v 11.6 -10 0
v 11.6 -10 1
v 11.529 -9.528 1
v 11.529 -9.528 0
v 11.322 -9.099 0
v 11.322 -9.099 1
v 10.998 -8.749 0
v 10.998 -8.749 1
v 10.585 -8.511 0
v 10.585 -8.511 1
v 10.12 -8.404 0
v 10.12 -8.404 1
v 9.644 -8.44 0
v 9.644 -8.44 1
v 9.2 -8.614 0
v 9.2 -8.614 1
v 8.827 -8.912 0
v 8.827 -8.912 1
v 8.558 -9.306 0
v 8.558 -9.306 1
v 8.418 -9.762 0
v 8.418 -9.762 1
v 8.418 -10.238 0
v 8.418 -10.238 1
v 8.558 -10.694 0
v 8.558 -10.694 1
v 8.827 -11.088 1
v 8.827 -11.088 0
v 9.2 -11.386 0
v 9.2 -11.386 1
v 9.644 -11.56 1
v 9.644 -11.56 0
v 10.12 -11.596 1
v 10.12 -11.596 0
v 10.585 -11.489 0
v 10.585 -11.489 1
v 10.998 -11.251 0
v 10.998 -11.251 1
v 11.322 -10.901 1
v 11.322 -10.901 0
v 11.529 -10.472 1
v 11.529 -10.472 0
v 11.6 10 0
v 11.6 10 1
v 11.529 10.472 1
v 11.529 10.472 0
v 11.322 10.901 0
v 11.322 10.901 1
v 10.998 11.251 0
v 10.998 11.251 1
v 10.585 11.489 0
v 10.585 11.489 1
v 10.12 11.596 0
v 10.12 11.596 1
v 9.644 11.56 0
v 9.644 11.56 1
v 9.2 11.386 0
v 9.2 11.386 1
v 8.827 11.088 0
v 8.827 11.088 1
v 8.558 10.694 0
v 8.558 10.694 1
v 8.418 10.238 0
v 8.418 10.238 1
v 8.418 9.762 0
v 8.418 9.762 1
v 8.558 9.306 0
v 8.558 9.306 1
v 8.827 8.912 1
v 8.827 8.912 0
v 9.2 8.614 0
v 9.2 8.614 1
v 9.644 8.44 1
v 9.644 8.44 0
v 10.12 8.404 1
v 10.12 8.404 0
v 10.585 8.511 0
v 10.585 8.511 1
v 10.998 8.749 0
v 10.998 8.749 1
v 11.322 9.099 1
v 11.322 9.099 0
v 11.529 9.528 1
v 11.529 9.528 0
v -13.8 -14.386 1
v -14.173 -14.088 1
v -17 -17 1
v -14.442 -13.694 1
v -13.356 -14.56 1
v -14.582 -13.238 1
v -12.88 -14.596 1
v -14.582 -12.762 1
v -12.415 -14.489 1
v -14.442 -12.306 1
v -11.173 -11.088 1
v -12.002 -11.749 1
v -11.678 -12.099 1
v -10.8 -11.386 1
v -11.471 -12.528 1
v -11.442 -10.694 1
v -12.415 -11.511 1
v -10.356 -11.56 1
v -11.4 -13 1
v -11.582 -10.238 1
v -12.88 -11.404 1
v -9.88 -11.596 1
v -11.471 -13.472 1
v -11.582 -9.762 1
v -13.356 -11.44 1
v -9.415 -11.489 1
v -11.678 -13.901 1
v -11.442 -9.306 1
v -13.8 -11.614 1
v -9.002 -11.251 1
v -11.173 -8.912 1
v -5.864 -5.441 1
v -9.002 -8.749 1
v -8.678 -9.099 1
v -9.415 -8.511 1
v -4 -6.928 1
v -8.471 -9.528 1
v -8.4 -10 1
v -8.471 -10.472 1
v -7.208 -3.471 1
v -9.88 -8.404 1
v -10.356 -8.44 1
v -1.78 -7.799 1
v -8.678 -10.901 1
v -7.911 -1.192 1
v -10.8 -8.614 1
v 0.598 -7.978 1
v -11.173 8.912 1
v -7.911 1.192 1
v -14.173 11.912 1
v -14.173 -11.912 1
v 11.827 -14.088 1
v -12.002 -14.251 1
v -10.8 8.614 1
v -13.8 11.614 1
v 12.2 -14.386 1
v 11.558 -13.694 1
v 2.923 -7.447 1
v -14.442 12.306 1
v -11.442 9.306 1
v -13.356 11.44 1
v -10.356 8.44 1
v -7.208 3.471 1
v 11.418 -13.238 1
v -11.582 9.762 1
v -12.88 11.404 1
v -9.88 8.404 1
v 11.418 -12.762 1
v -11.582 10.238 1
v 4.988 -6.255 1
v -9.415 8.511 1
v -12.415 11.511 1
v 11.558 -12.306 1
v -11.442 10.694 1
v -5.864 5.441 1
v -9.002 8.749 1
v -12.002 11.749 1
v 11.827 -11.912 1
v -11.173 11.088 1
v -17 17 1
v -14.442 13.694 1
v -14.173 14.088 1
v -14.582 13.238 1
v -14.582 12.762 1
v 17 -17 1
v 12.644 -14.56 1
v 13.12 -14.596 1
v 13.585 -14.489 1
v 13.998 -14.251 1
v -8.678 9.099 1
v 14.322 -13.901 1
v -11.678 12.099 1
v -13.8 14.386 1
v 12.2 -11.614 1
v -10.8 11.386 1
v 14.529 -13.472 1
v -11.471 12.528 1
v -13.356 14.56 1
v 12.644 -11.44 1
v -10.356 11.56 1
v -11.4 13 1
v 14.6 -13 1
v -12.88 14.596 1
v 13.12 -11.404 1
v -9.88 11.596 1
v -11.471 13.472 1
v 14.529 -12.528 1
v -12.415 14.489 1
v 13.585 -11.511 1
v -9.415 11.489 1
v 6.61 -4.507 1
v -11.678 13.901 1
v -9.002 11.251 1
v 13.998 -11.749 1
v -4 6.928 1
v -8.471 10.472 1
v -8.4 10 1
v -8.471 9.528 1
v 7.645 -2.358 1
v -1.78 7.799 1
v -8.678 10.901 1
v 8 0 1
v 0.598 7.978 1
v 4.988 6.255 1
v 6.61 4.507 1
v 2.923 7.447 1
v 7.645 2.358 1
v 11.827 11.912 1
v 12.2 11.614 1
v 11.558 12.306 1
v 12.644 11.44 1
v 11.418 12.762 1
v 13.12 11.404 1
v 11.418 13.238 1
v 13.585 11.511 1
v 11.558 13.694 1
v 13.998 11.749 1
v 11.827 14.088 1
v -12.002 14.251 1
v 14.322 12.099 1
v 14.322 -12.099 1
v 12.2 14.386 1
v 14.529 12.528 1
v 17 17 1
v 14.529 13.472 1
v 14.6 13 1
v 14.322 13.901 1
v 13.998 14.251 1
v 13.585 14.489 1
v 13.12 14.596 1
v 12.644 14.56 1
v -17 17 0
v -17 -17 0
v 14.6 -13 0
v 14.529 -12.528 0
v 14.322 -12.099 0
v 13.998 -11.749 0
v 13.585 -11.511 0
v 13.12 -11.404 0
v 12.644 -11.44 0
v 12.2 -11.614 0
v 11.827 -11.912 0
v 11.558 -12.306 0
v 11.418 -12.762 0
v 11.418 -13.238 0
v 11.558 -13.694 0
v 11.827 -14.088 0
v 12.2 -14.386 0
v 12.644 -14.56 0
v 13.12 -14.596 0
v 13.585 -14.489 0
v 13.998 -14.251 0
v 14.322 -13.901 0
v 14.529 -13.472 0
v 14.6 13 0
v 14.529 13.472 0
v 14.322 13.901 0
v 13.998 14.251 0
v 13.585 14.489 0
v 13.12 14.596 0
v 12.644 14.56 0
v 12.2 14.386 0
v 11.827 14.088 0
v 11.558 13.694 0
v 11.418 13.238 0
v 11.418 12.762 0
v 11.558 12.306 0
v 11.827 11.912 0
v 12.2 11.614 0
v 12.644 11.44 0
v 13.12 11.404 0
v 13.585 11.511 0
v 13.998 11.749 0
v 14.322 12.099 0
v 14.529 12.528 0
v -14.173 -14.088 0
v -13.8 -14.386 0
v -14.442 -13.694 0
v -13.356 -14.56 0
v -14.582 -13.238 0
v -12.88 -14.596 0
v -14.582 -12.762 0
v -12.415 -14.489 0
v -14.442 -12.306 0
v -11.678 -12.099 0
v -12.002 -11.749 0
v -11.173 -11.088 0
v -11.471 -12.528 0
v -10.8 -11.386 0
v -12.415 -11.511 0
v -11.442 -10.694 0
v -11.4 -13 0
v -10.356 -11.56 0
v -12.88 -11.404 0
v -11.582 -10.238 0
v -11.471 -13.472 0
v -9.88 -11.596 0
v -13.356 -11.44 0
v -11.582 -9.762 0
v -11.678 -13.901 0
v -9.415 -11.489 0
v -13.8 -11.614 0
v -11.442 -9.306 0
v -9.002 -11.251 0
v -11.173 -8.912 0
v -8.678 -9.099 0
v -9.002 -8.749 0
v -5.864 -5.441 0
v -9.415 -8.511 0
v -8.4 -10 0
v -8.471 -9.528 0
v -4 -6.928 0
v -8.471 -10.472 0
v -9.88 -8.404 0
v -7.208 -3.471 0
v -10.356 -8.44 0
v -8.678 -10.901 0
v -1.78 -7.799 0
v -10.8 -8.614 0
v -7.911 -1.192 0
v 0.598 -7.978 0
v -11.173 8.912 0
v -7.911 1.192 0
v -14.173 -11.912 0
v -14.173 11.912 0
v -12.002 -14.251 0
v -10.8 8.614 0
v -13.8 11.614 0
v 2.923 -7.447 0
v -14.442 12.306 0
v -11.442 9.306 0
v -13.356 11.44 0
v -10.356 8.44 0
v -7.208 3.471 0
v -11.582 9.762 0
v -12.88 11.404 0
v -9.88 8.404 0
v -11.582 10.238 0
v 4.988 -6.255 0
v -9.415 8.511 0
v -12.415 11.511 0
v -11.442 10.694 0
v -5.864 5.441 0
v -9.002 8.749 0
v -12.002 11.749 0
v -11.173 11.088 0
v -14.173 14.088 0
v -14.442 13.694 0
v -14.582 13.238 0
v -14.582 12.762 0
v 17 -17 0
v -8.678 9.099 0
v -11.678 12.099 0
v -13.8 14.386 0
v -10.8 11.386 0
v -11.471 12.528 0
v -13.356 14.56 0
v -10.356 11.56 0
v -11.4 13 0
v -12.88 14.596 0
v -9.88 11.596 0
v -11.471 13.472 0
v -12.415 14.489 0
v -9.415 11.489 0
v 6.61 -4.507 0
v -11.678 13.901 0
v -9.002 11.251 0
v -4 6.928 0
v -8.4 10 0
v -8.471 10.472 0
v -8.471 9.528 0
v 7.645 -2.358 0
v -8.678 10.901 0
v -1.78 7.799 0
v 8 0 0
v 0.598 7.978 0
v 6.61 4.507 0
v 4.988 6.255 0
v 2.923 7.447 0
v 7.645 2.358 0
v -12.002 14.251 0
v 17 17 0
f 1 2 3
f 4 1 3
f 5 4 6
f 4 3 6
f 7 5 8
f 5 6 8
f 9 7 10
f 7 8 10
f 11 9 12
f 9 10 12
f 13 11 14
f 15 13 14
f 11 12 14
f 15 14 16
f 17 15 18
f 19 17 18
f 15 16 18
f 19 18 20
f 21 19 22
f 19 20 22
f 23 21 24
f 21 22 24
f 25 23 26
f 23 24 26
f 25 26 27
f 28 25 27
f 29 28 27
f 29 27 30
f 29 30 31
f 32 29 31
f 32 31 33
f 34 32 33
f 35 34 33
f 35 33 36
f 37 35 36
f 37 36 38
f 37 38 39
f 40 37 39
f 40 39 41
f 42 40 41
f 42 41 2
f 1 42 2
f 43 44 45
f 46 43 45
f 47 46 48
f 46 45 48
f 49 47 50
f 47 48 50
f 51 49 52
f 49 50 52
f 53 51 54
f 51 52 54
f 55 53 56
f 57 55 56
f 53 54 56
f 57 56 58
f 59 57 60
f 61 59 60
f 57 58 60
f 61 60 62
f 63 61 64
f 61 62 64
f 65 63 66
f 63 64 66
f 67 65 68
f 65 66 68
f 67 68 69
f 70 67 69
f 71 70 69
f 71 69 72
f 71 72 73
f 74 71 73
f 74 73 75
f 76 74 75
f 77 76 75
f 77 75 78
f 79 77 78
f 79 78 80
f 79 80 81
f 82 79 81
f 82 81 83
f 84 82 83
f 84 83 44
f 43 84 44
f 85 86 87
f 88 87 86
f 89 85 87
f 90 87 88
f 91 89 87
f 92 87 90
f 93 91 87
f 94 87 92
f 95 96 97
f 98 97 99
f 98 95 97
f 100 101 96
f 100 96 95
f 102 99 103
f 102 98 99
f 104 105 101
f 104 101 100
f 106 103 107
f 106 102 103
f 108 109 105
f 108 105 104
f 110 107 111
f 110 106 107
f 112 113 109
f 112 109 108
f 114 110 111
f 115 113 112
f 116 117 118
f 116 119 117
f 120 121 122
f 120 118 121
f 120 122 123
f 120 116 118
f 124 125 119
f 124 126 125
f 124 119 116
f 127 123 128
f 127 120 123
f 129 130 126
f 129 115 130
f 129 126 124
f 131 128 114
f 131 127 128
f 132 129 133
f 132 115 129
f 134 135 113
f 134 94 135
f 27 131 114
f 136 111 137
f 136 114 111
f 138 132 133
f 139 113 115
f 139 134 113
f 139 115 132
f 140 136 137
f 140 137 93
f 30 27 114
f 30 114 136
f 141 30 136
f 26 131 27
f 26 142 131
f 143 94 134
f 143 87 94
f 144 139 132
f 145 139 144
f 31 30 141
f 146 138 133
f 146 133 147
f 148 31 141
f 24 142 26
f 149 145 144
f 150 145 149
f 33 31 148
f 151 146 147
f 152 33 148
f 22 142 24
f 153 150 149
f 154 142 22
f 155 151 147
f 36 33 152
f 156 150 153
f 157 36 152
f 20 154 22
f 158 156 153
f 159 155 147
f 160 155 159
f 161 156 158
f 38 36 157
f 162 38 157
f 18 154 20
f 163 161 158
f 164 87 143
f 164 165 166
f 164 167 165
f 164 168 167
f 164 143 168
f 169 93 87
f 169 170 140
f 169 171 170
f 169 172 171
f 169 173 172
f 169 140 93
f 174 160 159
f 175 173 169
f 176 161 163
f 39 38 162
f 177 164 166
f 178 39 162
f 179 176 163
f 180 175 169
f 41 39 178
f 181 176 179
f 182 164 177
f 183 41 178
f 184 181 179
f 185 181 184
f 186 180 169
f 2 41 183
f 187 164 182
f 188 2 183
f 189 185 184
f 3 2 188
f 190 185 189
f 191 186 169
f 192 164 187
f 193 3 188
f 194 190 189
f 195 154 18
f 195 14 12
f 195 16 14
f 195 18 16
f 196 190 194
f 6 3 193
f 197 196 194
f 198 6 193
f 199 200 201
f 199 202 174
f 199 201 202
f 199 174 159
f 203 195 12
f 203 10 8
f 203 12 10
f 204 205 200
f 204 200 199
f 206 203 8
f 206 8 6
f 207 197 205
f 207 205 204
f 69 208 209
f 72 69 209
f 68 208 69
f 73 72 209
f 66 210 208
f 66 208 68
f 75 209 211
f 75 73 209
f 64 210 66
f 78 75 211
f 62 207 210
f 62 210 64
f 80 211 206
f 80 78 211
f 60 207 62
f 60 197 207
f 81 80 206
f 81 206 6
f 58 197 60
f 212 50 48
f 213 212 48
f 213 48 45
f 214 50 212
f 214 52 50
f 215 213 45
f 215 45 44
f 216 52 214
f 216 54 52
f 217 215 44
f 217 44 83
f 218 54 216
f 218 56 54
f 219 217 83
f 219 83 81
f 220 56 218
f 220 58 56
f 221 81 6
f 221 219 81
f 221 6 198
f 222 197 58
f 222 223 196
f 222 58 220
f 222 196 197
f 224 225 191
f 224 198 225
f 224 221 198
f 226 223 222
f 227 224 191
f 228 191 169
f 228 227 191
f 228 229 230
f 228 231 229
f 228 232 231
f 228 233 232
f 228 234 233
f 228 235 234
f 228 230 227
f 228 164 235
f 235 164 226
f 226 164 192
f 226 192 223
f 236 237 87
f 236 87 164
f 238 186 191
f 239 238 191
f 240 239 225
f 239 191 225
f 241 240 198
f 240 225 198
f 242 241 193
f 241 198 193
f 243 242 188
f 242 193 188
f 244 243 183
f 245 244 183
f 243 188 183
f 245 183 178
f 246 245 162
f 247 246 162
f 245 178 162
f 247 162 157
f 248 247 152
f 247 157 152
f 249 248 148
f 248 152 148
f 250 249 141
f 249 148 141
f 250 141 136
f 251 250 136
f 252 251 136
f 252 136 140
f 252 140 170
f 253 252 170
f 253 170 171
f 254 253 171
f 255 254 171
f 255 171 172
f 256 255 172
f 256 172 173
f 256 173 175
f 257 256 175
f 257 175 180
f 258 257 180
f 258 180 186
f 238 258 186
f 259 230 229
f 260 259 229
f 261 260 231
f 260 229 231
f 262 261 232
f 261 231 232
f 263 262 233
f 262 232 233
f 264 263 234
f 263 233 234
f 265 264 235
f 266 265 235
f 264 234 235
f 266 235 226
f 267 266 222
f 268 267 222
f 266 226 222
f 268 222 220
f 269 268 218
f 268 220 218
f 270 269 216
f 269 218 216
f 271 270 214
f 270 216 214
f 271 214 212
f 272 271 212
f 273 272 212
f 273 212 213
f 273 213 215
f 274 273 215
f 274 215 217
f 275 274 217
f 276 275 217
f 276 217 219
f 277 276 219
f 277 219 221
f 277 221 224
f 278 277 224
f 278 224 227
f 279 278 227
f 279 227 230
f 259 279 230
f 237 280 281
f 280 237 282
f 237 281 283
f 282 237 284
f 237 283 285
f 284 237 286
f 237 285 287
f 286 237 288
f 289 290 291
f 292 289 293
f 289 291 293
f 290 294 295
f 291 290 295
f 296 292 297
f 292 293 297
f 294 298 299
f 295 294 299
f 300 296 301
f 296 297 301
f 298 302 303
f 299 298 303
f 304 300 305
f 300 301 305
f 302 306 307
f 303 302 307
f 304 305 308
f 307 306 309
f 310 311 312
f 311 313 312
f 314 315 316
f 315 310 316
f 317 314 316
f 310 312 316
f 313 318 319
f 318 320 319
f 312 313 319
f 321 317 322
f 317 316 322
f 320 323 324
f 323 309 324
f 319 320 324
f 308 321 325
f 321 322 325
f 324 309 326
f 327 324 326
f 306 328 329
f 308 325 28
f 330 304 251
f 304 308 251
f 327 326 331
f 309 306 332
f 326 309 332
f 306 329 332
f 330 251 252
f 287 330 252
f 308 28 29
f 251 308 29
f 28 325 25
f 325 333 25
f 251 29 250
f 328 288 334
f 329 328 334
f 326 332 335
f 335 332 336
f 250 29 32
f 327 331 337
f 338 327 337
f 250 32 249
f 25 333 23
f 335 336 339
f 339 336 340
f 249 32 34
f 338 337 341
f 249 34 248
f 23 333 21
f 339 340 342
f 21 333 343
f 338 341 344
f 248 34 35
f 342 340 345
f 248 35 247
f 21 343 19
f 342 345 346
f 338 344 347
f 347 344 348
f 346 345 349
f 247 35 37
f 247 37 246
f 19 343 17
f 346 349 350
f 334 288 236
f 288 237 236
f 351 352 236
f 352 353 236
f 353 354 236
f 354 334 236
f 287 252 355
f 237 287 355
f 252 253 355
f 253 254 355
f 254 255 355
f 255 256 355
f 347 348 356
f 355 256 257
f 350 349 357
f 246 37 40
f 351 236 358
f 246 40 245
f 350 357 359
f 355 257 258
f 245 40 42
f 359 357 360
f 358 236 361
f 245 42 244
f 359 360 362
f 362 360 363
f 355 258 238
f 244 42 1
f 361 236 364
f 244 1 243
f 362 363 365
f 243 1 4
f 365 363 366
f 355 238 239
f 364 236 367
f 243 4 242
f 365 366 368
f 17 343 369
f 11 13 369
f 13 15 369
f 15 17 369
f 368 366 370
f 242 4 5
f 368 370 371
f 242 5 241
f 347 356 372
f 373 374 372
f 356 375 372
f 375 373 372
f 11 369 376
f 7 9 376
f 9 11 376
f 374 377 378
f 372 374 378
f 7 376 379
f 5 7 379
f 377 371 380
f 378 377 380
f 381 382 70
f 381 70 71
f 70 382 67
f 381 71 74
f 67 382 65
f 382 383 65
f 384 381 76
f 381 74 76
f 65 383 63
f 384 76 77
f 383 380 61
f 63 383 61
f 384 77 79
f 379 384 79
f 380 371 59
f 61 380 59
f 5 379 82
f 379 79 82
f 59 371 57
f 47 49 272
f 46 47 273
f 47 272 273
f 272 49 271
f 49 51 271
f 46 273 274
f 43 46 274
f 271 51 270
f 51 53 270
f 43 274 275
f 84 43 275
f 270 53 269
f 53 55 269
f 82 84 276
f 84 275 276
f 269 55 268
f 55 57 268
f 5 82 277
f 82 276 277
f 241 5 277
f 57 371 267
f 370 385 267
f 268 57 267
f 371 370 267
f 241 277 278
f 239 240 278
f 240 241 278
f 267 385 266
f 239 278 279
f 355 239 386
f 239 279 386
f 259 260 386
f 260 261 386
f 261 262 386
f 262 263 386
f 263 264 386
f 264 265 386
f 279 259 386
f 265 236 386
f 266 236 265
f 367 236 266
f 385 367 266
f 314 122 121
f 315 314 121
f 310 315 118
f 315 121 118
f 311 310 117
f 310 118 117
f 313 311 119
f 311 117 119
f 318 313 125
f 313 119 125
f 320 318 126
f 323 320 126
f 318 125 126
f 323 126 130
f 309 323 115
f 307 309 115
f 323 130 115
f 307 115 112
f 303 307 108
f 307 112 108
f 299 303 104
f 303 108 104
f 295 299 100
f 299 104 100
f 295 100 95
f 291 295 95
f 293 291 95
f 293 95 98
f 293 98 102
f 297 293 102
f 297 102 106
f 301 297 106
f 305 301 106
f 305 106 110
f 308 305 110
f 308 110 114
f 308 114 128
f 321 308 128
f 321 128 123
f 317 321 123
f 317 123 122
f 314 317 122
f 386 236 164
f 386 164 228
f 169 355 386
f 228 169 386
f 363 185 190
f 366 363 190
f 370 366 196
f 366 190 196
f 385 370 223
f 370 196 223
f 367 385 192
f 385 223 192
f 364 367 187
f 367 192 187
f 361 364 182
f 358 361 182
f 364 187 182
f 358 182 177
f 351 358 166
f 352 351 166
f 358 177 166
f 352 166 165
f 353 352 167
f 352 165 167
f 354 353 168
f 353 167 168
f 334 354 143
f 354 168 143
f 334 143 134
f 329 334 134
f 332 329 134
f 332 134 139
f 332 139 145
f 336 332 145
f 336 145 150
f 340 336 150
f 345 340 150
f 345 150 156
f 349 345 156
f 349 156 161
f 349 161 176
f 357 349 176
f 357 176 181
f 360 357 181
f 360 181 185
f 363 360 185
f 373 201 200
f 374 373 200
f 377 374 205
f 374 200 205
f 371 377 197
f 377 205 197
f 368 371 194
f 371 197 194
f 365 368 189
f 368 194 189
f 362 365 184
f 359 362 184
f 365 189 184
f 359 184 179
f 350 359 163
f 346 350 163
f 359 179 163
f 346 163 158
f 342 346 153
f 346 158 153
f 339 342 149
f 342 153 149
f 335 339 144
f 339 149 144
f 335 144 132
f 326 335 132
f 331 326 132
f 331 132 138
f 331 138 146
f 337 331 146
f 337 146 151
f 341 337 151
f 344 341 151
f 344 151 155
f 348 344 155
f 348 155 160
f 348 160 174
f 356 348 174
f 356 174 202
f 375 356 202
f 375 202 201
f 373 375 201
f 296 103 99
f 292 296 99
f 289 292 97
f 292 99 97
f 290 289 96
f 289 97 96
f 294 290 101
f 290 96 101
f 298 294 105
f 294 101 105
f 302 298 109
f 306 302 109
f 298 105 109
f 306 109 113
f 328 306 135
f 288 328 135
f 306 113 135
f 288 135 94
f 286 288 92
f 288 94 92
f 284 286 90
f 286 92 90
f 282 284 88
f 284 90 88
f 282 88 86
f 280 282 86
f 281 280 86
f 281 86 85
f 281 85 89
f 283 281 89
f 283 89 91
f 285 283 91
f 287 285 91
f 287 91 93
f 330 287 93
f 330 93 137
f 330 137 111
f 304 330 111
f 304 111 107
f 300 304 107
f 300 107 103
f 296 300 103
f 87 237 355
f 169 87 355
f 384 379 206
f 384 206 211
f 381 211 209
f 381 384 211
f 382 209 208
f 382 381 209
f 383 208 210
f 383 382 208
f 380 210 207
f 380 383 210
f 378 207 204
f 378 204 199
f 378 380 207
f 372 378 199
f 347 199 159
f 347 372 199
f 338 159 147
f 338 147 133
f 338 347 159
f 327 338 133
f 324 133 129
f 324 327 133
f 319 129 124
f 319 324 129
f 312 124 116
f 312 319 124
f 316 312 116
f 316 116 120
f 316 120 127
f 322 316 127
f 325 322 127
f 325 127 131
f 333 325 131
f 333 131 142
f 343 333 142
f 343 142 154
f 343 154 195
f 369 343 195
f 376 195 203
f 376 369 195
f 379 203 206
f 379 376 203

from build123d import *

# Parameters (mm, degrees)
SKETCH_W        = 34
SKETCH_H        = 34
SKETCH_R        = 8
PAD_DEPTH       = 1
SKETCH001_R     = 1.6
POCKET_DEPTH    = 5
SKETCH002_R     = 1.6
POCKET001_DEPTH = 5


with BuildPart() as part:
    # Sketch → Pad (new body)
    with BuildSketch(Plane.XY):
        Rectangle(SKETCH_W, SKETCH_H)
        Circle(SKETCH_R, mode=Mode.SUBTRACT)
    extrude(amount=PAD_DEPTH)

    # Sketch001 (on Face7 of Pad) → Pocket (cut)
    with BuildSketch(Plane.XY.offset(1)):
        with Locations((10, 10)):
            Circle(SKETCH001_R)
        with Locations((10, -10)):
            Circle(SKETCH001_R)
        with Locations((-10, 10)):
            Circle(SKETCH001_R)
        with Locations((-10, -10)):
            Circle(SKETCH001_R)
    extrude(amount=-POCKET_DEPTH, mode=Mode.SUBTRACT)

    # Sketch002 (on Face5 of Pocket) → Pocket001 (cut)
    with BuildSketch(Plane.XY.offset(1)):
        with Locations((-13, 13)):
            Circle(SKETCH002_R)
        with Locations((13, 13)):
            Circle(SKETCH002_R)
        with Locations((-13, -13)):
            Circle(SKETCH002_R)
        with Locations((13, -13)):
            Circle(SKETCH002_R)
    extrude(amount=-POCKET001_DEPTH, mode=Mode.SUBTRACT)


solid = part.part
